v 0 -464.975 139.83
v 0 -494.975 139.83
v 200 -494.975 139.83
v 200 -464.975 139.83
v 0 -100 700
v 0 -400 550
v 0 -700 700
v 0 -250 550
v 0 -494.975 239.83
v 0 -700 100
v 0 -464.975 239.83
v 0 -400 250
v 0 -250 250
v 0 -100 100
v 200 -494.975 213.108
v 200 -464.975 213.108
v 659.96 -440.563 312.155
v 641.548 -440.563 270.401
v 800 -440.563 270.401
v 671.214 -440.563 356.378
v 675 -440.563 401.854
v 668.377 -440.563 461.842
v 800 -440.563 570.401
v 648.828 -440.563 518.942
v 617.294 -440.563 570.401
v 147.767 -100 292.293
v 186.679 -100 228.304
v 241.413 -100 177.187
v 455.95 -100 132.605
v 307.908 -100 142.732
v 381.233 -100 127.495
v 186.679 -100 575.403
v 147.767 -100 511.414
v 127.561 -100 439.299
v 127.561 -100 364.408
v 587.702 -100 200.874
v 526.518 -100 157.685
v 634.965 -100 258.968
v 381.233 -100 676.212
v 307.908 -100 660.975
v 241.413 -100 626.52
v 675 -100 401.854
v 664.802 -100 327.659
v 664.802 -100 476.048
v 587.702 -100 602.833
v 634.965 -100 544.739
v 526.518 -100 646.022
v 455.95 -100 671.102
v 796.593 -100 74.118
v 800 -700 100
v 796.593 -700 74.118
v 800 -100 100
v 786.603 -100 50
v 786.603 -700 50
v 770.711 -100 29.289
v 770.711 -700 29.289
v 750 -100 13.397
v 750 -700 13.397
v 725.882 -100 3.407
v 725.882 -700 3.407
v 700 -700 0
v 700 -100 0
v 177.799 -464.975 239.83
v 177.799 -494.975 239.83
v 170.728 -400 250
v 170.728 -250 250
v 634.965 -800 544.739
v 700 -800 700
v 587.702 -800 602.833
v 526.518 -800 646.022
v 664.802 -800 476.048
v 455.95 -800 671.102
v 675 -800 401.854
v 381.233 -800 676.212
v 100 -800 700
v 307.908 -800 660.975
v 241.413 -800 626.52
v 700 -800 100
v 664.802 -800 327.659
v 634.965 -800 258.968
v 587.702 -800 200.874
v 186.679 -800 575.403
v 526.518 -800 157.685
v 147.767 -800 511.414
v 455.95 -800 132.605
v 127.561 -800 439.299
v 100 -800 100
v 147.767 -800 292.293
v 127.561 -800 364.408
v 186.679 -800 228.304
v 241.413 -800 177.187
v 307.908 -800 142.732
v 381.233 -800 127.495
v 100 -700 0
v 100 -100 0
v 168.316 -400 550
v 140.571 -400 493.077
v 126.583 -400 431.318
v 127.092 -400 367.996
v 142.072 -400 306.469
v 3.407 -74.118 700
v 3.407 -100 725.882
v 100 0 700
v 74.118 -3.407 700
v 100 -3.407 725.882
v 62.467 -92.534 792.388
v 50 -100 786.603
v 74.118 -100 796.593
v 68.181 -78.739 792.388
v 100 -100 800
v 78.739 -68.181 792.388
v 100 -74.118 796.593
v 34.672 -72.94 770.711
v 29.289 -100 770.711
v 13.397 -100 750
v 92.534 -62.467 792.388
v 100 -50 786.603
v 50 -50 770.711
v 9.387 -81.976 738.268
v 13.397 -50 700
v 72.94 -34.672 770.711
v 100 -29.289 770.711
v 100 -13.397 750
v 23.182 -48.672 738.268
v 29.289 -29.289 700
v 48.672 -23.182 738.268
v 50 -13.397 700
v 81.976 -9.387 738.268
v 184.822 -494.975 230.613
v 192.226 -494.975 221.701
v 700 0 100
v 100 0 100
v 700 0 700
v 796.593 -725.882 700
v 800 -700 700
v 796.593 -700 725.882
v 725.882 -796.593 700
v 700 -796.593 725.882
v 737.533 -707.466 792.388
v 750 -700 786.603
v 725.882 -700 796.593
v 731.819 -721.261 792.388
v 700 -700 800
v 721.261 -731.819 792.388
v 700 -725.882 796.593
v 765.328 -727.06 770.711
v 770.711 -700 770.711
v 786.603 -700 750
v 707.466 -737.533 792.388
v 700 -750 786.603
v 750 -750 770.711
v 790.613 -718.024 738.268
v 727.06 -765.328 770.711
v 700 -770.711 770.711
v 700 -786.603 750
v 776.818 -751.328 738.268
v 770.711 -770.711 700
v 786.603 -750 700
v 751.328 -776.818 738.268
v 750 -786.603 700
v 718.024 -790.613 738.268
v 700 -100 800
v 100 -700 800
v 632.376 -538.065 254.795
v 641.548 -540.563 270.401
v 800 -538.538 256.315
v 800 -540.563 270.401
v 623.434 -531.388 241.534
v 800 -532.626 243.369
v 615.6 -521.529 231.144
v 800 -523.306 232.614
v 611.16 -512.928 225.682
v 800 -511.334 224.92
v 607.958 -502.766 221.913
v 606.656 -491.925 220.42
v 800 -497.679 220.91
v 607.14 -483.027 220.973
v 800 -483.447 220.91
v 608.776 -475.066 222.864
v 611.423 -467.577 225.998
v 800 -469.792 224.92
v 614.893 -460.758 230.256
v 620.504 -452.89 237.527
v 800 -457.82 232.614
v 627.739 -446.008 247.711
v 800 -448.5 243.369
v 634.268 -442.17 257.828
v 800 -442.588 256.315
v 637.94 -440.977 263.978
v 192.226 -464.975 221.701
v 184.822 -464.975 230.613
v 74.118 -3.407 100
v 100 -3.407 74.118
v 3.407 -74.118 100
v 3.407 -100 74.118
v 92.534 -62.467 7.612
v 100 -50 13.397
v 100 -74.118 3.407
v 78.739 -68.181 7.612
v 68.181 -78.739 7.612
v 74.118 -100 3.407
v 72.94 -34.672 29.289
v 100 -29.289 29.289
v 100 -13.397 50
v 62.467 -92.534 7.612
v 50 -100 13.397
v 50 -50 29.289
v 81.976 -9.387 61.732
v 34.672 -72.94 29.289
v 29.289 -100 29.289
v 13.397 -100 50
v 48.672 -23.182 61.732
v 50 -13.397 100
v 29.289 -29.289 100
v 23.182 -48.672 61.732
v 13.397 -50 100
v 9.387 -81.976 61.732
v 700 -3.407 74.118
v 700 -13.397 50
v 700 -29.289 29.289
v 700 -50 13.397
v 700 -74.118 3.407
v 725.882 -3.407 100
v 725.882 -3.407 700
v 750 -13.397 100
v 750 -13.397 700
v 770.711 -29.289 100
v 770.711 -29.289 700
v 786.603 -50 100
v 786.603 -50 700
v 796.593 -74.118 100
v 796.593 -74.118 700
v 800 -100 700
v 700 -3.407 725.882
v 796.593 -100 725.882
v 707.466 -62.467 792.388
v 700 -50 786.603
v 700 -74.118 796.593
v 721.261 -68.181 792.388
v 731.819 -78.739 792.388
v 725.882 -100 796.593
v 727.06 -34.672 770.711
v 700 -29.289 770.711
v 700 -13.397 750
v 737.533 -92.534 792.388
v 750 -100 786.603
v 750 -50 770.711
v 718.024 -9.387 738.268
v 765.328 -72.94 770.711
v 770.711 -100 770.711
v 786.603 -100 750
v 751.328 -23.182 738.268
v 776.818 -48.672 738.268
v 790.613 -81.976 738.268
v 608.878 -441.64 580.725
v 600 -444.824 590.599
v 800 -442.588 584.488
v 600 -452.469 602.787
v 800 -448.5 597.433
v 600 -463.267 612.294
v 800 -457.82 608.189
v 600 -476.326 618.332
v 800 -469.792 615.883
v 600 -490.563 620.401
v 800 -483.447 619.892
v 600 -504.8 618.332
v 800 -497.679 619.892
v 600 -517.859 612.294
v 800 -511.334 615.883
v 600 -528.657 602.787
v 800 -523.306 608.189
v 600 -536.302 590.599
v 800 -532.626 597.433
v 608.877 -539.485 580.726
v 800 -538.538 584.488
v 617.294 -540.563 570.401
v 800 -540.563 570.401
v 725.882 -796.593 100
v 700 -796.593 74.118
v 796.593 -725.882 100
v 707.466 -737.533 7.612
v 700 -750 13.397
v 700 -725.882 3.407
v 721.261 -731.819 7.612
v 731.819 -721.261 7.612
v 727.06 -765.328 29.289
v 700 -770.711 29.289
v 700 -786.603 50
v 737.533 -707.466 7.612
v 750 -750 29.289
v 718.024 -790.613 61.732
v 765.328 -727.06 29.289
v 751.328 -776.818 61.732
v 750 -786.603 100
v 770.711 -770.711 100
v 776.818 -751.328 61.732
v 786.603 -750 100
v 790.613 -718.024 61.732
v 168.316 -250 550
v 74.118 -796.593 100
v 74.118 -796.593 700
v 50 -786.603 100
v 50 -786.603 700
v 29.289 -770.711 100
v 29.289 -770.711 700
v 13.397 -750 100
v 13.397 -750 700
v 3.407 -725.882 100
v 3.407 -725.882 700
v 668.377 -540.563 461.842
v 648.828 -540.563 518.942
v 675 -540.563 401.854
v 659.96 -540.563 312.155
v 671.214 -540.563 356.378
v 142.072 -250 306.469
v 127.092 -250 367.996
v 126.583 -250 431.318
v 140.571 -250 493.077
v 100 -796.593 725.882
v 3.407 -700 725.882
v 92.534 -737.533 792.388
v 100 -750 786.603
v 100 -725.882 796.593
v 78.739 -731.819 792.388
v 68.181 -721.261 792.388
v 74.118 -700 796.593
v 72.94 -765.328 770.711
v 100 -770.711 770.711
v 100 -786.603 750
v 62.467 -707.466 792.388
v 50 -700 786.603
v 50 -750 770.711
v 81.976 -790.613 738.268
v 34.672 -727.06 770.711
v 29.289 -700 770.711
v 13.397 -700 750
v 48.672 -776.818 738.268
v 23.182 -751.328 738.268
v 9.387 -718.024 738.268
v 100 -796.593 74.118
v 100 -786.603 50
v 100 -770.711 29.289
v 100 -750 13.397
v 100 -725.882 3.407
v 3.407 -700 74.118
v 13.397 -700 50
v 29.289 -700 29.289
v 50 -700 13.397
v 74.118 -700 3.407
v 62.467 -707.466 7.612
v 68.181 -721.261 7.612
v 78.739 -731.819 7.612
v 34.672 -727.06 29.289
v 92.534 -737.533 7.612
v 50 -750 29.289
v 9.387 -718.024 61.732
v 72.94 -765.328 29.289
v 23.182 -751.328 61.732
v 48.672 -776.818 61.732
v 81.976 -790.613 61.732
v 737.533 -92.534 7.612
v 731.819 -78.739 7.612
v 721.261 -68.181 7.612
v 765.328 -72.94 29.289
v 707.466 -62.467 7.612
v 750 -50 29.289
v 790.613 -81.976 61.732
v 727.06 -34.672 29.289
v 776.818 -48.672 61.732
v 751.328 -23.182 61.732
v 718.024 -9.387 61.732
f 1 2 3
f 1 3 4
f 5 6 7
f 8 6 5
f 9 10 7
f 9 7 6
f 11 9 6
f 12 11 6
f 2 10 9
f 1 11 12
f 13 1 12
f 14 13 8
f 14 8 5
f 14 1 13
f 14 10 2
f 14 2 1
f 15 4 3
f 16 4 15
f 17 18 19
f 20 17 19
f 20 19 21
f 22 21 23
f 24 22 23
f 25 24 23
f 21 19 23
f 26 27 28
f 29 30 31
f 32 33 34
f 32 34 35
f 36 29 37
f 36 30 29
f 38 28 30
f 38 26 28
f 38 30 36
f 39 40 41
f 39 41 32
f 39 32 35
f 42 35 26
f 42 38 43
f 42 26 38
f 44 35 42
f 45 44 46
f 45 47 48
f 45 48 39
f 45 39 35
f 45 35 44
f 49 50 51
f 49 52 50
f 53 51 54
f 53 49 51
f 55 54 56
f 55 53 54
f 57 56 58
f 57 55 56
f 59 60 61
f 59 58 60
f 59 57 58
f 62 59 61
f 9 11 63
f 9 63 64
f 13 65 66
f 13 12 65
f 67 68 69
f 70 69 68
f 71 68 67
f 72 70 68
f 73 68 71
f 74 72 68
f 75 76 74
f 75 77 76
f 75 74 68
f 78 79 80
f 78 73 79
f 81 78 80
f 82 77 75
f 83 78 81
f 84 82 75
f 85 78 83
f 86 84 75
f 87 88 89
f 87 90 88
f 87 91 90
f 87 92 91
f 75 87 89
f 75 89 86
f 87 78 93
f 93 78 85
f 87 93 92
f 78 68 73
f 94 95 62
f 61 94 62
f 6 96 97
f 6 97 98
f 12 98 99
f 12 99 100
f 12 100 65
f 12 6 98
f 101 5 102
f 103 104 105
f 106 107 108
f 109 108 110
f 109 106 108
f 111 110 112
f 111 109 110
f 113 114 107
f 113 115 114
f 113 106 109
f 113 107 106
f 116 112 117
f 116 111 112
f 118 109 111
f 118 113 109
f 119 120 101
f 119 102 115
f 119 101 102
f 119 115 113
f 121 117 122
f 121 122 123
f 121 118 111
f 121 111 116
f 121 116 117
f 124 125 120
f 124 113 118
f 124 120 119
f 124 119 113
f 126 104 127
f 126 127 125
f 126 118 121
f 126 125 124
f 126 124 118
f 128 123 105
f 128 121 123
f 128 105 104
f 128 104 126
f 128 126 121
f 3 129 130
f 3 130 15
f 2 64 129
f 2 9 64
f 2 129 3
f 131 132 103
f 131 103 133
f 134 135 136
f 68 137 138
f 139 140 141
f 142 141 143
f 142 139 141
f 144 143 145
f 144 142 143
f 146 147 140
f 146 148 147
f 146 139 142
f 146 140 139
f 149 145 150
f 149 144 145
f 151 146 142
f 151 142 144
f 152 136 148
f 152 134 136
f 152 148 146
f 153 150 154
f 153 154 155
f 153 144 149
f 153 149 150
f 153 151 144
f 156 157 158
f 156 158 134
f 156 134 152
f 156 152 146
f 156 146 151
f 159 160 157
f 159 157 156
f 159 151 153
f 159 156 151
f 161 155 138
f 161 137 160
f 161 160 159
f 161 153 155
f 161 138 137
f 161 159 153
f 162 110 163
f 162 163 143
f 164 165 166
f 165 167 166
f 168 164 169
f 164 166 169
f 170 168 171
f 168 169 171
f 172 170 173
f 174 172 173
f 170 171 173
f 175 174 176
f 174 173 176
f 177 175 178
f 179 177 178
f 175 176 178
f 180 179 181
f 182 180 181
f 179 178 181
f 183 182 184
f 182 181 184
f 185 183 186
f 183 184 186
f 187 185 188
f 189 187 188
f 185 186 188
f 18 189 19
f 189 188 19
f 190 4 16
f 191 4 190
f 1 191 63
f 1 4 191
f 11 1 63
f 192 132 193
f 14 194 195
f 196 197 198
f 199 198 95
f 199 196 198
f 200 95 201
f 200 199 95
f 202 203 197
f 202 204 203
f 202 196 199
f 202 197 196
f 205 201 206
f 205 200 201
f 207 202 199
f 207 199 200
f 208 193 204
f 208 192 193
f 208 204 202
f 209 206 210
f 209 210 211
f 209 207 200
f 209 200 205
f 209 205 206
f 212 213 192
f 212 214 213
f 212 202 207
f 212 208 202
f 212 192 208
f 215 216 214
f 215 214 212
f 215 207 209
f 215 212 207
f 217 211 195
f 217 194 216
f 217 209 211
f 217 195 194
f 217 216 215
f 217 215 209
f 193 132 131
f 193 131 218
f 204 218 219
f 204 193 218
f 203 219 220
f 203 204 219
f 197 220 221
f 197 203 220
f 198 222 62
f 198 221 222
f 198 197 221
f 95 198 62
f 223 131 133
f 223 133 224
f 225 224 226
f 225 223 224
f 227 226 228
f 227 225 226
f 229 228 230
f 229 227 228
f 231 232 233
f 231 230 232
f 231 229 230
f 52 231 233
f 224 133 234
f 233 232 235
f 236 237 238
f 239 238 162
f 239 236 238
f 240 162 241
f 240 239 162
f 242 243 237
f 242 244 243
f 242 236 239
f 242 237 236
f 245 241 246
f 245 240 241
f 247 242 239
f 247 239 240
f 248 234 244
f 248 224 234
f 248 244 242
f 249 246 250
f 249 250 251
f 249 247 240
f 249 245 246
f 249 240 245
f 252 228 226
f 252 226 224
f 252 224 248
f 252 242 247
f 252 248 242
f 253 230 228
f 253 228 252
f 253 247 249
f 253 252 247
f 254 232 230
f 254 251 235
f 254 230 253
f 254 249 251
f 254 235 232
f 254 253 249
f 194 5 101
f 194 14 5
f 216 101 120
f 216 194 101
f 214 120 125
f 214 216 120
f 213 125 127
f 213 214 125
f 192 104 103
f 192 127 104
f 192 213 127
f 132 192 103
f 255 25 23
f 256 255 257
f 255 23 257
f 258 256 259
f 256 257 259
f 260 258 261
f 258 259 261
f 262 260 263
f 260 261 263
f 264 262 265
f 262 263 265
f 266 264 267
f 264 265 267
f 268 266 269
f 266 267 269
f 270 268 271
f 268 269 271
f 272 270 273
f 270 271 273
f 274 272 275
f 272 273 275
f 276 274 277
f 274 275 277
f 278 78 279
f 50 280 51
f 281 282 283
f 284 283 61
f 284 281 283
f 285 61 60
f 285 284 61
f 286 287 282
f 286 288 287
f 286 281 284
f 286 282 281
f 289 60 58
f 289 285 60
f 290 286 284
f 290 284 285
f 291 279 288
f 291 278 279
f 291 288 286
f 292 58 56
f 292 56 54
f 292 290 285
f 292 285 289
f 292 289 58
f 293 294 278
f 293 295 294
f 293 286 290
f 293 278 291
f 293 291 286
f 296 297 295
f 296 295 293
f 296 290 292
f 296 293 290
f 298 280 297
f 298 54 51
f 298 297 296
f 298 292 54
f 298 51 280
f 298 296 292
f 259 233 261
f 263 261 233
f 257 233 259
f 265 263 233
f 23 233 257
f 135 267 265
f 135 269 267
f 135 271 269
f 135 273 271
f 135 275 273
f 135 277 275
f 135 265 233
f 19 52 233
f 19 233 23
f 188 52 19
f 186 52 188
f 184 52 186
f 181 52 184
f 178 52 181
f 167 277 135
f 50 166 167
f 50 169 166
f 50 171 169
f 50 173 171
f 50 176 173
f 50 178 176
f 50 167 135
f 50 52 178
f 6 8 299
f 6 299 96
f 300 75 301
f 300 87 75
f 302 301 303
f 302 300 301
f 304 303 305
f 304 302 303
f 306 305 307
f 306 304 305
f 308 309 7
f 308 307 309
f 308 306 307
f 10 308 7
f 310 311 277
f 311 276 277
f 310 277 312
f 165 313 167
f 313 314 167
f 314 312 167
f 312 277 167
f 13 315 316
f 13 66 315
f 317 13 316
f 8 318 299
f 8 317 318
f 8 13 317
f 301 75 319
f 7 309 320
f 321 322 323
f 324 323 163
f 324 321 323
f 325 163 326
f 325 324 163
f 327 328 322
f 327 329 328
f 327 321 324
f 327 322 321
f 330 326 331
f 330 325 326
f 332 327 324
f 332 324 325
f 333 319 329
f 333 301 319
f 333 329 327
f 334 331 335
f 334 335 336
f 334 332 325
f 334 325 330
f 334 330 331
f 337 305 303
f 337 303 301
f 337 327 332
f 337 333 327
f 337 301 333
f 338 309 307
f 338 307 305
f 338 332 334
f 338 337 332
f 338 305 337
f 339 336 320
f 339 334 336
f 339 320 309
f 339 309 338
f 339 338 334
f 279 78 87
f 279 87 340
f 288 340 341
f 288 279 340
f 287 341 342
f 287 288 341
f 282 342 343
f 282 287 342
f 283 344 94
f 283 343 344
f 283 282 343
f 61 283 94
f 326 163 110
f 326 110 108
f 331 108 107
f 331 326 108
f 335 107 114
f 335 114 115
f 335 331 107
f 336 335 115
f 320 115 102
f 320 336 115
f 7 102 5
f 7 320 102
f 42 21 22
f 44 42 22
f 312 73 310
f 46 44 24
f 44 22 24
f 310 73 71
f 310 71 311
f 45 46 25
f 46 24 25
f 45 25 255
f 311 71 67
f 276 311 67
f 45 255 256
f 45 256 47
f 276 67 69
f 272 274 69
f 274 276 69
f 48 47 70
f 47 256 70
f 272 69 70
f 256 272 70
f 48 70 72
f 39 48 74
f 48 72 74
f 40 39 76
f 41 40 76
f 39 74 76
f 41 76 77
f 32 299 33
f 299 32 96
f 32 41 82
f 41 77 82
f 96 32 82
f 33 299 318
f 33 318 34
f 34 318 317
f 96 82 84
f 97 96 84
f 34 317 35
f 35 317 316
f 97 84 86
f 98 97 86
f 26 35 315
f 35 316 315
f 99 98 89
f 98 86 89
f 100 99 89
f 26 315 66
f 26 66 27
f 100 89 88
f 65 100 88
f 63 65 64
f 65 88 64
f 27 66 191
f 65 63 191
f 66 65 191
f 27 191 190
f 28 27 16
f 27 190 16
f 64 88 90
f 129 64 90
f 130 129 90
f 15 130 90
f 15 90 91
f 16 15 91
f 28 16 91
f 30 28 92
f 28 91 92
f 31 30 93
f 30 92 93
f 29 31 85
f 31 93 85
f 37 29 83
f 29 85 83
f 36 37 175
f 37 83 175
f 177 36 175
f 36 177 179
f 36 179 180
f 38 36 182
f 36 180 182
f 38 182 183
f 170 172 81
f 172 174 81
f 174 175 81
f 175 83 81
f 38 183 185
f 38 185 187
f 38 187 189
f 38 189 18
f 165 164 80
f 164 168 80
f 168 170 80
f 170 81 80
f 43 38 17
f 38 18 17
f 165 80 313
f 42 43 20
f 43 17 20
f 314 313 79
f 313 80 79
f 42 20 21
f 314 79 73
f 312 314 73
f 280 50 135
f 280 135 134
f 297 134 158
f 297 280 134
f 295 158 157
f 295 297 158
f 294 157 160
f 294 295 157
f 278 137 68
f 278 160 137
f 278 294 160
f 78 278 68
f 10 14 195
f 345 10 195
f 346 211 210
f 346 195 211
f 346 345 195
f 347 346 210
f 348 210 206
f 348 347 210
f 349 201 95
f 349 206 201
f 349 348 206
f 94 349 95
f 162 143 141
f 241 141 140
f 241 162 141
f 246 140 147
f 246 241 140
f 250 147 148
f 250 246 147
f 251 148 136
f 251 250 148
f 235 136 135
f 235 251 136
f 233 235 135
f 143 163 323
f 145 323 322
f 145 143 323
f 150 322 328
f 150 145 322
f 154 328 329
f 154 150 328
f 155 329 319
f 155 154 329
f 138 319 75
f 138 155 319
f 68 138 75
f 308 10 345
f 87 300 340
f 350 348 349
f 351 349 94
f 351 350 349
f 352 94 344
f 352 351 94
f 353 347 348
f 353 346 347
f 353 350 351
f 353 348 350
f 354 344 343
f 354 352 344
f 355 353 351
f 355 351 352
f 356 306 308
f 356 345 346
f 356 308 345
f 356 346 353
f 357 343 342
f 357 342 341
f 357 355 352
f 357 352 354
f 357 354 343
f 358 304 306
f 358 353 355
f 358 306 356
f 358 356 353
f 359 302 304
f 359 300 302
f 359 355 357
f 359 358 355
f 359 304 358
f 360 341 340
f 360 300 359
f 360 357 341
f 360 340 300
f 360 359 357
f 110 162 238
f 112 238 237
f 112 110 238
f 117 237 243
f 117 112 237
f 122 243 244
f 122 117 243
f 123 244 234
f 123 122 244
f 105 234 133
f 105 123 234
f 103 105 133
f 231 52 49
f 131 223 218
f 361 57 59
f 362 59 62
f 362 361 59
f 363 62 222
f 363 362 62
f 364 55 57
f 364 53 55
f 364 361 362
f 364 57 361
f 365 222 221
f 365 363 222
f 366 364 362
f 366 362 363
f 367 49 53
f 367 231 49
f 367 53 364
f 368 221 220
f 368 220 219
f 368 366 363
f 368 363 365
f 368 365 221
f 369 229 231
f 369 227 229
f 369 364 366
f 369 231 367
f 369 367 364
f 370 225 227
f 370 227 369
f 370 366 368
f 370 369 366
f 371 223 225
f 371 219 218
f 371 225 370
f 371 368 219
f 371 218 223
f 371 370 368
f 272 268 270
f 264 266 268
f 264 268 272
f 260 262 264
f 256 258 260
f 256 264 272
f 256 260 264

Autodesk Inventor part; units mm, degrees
ref_plane "YZ Plane" through (0, 0, 0) normal (1, 0, 0) x (0, 1, 0)
ref_plane "XZ Plane" through (0, 0, 0) normal (0, 1, 0) x (-1, 0, 0)
ref_plane "XY Plane" through (0, 0, 0) normal (0, 0, 1) x (1, 0, 0)
sketch "Sketch1" plane through (0, 0, 0) normal (0, 0, 1) x (1, 0, 0)
  line L0 (100, 0) -> (700, 0)
  line L1 (800, -100) -> (800, -700)
  line L2 (700, -800) -> (100, -800)
  line L3 (0, -700) -> (0, -100)
  arc A0 (2, 0) -> (0, -2) centre (2, -2) ccw
  arc A1 (800, -100) -> (700, 0) centre (700, -100) ccw
  arc A2 (100, 0) -> (0, -100) centre (100, -100) ccw
  arc A3 (0, -700) -> (100, -800) centre (100, -700) ccw
  arc A4 (700, -800) -> (800, -700) centre (700, -700) ccw
  point P0 (0, 0)
  point P1 (800, -800)
  point P2 (0, -800)
  dimension "d0" = 800
  dimension "d1" = 800
  dimension "d2" = 2
  dimension "d3" = 100
extrude "Extrusion1" add sketch "Sketch1" along normal blind 800
sketch "Sketch2" plane through (0, -700, 0) normal (-1, 0, 0) x (0, 0, 1)
  line L0 (250, 450) -> (550, 450)
  line L1 (550, 450) -> (550, 300)
  line L2 (550, 300) -> (250, 300)
  line L3 (250, 300) -> (250, 450)
  line L4 (0, 700) -> (800, 700) projected
  line L5 (0, -100) -> (800, -100) projected
  line L6 (800, 600) -> (800, 0) projected
  line L7 (0, 600) -> (0, 0) projected
  dimension "d6" = 300
  dimension "d7" = 150
  dimension "d8" = 250
  dimension "d9" = 400
  dimension "d10" = 250
  dimension "d11" = 250
extrude "Extrusion2" cut sketch "Sketch2" against normal blind 200
fillet "Fillet1" radius 100 16 edges at (29.2893, -770.7107, 0) (400, -800, 0) (770.7107, -770.7107, 0) (800, -400, 0) (770.7107, -29.2893, 0) (400, 0, 0) (29.2893, -29.2893, 0) (0, -400, 0) (29.2893, -770.7107, 800) (400, -800, 800) (770.7107, -770.7107, 800) (800, -400, 800) (770.7107, -29.2893, 800) (400, 0, 800) (29.2893, -29.2893, 800) (0, -400, 800)
sketch "Sketch3" plane through (100, -800, 700) normal (0, -1, 0) x (1, 0, 0)
  circle A0 centre (300, -298.1465) radius 275
  line L0 (-100, -600) -> (-100, 0) projected
  line L1 (700, -600) -> (700, 0) projected
  point P0 (-100, -700)
  dimension "d15" = 550
  dimension "d16" = 400
  dimension "d17" = 400
extrude "Extrusion3" cut sketch "Sketch3" against normal blind 700
sketch "Sketch4" plane through (0, -700, 700) normal (-1, 0, 0) x (0, 0, 1)
  line L0 (-560.17, 235.0251) -> (-460.17, 235.0251)
  line L1 (-460.17, 235.0251) -> (-460.17, 205.0251)
  line L2 (-460.17, 205.0251) -> (-560.17, 205.0251)
  line L3 (-560.17, 205.0251) -> (-560.17, 235.0251)
  point P0 (-700, 700)
  dimension "d20" = 100
  dimension "d21" = 30
extrude "Extrusion4" cut sketch "Sketch4" against normal blind 200
sketch "Sketch5" plane through (800, -700, 700) normal (1, 0, 0) x (0, 0, -1)
  line L0 (129.5986, 209.4371) -> (429.5986, 209.4371) construction
  line L1 (129.5986, 159.4371) -> (429.5986, 159.4371)
  line L2 (429.5986, 259.4371) -> (129.5986, 259.4371)
  arc A0 (129.5986, 259.4371) -> (129.5986, 159.4371) centre (129.5986, 209.4371) ccw
  arc A1 (429.5986, 159.4371) -> (429.5986, 259.4371) centre (429.5986, 209.4371) ccw
  point P0 (700, 700)
  point P1 (279.5986, 209.4371)
  dimension "d24" = 300
  dimension "d25" = 100
extrude "Extrusion5" cut sketch "Sketch5" against normal blind 200
properties part number "Head_prototype2"
